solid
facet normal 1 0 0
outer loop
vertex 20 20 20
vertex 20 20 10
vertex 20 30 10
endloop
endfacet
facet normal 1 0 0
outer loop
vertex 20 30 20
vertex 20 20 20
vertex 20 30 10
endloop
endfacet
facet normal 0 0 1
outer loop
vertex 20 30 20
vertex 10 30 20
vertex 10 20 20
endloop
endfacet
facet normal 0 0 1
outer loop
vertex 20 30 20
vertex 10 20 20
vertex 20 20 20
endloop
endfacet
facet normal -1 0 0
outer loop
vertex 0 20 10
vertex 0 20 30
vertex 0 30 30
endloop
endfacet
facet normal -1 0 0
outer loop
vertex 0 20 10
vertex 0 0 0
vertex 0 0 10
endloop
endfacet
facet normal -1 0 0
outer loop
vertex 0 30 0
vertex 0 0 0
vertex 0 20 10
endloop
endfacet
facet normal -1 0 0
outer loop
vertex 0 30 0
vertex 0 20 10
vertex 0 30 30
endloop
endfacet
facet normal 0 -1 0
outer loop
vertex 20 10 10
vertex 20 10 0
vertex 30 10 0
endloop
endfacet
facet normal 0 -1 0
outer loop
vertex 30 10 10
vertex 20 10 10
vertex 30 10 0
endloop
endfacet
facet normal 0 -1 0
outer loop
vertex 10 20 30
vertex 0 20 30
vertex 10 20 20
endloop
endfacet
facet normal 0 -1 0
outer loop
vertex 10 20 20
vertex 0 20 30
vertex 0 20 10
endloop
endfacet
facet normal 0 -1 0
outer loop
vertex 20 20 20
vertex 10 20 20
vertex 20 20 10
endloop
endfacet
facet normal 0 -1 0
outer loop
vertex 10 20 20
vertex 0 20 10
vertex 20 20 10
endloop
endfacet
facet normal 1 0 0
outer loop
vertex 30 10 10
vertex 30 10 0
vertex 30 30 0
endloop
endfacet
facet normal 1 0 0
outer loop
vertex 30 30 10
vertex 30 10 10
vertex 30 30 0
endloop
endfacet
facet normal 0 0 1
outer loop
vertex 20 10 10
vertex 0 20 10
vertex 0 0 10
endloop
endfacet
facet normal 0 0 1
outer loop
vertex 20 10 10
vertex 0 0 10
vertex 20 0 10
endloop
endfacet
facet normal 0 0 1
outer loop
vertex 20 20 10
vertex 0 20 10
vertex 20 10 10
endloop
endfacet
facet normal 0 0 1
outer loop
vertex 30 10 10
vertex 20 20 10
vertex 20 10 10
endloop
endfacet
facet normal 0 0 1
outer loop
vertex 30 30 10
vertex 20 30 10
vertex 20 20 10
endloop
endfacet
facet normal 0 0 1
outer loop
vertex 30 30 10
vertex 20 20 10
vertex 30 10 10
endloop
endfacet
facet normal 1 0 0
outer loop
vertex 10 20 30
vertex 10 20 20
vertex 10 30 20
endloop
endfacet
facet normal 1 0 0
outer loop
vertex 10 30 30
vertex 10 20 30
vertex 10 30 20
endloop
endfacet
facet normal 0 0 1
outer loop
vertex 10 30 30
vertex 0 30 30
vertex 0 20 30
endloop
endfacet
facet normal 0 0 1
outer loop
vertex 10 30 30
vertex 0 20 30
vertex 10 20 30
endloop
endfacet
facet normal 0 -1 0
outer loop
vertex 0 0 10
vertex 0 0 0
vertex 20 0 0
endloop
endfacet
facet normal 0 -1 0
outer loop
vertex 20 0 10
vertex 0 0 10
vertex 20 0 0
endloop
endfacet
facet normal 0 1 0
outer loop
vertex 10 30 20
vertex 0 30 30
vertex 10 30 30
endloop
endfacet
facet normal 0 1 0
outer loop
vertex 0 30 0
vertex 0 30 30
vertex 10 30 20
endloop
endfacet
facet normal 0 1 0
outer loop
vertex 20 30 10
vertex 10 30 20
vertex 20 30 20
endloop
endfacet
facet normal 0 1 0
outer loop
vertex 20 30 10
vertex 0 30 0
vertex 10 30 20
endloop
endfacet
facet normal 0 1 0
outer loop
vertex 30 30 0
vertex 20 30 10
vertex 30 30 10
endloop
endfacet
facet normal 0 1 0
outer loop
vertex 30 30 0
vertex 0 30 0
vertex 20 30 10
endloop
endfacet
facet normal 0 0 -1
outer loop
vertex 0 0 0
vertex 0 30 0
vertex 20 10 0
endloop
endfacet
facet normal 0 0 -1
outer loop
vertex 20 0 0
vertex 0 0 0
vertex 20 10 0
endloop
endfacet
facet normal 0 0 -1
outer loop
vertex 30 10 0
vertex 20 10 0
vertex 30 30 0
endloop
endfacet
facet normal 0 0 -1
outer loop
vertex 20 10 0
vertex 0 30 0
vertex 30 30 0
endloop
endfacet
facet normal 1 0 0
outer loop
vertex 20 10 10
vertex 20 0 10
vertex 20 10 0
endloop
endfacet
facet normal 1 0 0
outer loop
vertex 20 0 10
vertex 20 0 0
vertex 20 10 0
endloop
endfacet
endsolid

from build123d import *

# Parameters (mm, degrees)
BOX002_W     = 10
BOX002_H     = 10
BOX002_DEPTH = 10
BOX003_W     = 20
BOX003_H     = 10
BOX003_DEPTH = 10
BOX004_W     = 10
BOX004_H     = 20
BOX004_DEPTH = 10
BOX_W        = 20
BOX_H        = 30
BOX_DEPTH    = 10


with BuildPart() as cubo002:
    # Box002 → Box002 (new body)
    with BuildSketch(Plane(origin=(0, 20, 20), x_dir=(1, 0, 0), z_dir=(0, 0, 1))):
        with Locations((5, 5)):
            Rectangle(BOX002_W, BOX002_H)
    extrude(amount=BOX002_DEPTH)


with BuildPart() as cubo003:
    # Box003 → Box003 (new body)
    with BuildSketch(Plane(origin=(0, 20, 10), x_dir=(1, 0, 0), z_dir=(0, 0, 1))):
        with Locations((10, 5)):
            Rectangle(BOX003_W, BOX003_H)
    extrude(amount=BOX003_DEPTH)


with BuildPart() as cubo004:
    # Box004 → Box004 (new body)
    with BuildSketch(Plane(origin=(20, 10, 0), x_dir=(1, 0, 0), z_dir=(0, 0, 1))):
        with Locations((5, 10)):
            Rectangle(BOX004_W, BOX004_H)
    extrude(amount=BOX004_DEPTH)


with BuildPart() as fusion:
    # Box → Box (new body)
    with BuildSketch(Plane.XY):
        with Locations((10, 15)):
            Rectangle(BOX_W, BOX_H)
    extrude(amount=BOX_DEPTH)

    # Fusion: union Cubo002, Cubo003, Cubo004
    add(cubo002.part)
    add(cubo003.part)
    add(cubo004.part)


solid = fusion.part
